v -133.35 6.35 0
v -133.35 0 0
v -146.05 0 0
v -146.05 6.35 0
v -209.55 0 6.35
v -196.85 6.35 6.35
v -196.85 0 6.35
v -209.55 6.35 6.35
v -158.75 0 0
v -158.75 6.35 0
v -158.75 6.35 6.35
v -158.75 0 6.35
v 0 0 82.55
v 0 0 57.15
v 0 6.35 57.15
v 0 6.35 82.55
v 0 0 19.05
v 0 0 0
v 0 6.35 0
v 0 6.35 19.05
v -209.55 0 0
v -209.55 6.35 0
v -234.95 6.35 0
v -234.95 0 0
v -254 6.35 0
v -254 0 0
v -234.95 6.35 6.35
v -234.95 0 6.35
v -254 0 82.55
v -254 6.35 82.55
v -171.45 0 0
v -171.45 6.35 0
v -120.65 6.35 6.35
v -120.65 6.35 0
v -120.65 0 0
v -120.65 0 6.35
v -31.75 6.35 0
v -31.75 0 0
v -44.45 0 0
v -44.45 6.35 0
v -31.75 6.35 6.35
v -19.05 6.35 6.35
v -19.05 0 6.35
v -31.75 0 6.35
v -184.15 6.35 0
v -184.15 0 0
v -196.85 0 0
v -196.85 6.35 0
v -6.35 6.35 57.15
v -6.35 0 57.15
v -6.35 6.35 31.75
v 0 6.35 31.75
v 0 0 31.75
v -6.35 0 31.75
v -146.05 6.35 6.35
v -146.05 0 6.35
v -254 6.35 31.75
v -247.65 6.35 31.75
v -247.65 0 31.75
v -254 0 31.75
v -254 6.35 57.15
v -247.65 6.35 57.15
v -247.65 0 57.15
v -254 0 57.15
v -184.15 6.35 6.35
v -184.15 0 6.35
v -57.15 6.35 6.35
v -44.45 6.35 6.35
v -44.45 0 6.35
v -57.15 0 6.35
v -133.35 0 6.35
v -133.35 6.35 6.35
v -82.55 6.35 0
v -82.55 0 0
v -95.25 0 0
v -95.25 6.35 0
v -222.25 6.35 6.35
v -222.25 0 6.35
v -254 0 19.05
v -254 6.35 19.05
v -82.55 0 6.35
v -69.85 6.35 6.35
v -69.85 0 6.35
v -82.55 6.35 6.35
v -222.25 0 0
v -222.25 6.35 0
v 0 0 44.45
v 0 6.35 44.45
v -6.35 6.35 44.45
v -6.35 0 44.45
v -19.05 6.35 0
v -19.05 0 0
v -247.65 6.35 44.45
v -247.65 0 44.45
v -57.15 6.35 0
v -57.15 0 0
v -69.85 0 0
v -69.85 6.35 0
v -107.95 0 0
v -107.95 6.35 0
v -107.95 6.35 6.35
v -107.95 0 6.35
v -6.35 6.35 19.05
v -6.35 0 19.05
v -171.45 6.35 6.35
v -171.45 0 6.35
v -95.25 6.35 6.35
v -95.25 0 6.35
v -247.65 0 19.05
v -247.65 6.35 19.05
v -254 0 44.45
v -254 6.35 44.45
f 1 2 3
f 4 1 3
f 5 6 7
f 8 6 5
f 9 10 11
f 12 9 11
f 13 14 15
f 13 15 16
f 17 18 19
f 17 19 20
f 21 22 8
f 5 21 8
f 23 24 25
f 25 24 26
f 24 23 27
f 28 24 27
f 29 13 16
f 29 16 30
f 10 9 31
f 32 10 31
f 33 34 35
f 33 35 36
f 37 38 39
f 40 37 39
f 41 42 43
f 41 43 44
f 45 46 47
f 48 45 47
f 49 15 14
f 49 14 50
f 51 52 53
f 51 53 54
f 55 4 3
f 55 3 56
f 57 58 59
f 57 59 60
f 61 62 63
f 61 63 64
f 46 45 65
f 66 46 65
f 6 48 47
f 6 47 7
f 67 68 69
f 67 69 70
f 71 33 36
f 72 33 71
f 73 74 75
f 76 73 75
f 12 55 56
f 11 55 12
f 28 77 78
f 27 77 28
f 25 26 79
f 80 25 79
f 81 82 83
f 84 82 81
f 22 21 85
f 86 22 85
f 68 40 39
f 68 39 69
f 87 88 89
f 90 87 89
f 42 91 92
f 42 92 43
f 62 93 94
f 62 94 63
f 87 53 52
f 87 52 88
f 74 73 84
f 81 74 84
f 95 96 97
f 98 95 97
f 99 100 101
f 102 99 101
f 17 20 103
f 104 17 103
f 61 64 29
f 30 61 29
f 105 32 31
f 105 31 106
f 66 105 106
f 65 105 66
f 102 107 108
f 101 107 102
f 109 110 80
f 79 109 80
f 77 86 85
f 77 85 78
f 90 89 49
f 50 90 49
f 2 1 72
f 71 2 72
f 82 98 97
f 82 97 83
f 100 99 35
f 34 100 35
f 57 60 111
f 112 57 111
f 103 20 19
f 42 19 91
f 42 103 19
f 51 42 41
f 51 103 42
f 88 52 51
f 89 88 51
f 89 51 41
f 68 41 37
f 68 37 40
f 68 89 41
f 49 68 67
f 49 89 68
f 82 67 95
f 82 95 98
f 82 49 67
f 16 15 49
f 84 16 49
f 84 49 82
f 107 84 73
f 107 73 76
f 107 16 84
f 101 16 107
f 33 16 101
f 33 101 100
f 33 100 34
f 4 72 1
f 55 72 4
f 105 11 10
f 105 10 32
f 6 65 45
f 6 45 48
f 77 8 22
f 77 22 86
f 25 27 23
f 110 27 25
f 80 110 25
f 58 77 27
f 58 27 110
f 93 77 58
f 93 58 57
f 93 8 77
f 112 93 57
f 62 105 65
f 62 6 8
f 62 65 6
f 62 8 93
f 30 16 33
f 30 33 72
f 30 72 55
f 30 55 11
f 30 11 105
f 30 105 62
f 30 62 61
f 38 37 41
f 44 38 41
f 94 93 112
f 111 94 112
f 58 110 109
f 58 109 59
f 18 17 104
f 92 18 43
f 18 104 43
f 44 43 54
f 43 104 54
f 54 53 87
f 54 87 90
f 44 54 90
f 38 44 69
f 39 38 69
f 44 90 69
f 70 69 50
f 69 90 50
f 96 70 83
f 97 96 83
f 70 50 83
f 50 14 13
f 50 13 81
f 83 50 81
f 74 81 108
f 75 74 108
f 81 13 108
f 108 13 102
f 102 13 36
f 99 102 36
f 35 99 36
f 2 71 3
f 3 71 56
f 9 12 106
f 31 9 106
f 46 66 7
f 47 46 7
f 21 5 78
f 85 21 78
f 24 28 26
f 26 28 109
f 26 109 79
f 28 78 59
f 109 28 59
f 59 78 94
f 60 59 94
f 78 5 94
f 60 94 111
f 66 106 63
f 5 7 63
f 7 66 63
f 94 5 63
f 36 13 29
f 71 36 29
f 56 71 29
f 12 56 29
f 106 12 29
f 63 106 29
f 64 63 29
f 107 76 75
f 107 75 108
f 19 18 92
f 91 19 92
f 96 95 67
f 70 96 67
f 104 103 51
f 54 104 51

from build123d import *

# Parameters (mm, degrees)
SKETCH3_W           = 254
SKETCH3_H           = 82.55
BOSS_EXTRUDE2_DEPTH = 6.35
SKETCH4_W           = 6.35
SKETCH4_H           = 12.7
SKETCH4_W_2         = 12.7
SKETCH4_H_2         = 6.35
CUT_EXTRUDE2_DEPTH  = 6.35


with BuildPart() as part:
    # Sketch3 → Boss-Extrude2 (new body)
    with BuildSketch(Plane(origin=(0, 0, 0), x_dir=(-1, 0, 0), z_dir=(0, 1, 0))):
        with Locations((127, 41.275)):
            Rectangle(SKETCH3_W, SKETCH3_H)
    extrude(amount=BOSS_EXTRUDE2_DEPTH)

    # Sketch4 → Cut-Extrude2 (cut)
    with BuildSketch(Plane(origin=(0, 6.35, 0), x_dir=(-1, 0, 0), z_dir=(0, 1, 0))):
        with Locations((3.175, 25.4)):
            Rectangle(SKETCH4_W, SKETCH4_H)
        with Locations((3.175, 50.8)):
            Rectangle(SKETCH4_W, SKETCH4_H)
        with Locations((250.825, 25.4)):
            Rectangle(SKETCH4_W, SKETCH4_H)
        with Locations((250.825, 50.8)):
            Rectangle(SKETCH4_W, SKETCH4_H)
        with Locations((50.8, 3.175)):
            Rectangle(SKETCH4_W_2, SKETCH4_H_2)
        with Locations((25.4, 3.175)):
            Rectangle(SKETCH4_W_2, SKETCH4_H_2)
        with Locations((76.2, 3.175)):
            Rectangle(SKETCH4_W_2, SKETCH4_H_2)
        with Locations((101.6, 3.175)):
            Rectangle(SKETCH4_W_2, SKETCH4_H_2)
        with Locations((127, 3.175)):
            Rectangle(SKETCH4_W_2, SKETCH4_H_2)
        with Locations((177.8, 3.175)):
            Rectangle(SKETCH4_W_2, SKETCH4_H_2)
        with Locations((152.4, 3.175)):
            Rectangle(SKETCH4_W_2, SKETCH4_H_2)
        with Locations((203.2, 3.175)):
            Rectangle(SKETCH4_W_2, SKETCH4_H_2)
        with Locations((228.6, 3.175)):
            Rectangle(SKETCH4_W_2, SKETCH4_H_2)
    extrude(amount=-CUT_EXTRUDE2_DEPTH, mode=Mode.SUBTRACT)


solid = part.part
